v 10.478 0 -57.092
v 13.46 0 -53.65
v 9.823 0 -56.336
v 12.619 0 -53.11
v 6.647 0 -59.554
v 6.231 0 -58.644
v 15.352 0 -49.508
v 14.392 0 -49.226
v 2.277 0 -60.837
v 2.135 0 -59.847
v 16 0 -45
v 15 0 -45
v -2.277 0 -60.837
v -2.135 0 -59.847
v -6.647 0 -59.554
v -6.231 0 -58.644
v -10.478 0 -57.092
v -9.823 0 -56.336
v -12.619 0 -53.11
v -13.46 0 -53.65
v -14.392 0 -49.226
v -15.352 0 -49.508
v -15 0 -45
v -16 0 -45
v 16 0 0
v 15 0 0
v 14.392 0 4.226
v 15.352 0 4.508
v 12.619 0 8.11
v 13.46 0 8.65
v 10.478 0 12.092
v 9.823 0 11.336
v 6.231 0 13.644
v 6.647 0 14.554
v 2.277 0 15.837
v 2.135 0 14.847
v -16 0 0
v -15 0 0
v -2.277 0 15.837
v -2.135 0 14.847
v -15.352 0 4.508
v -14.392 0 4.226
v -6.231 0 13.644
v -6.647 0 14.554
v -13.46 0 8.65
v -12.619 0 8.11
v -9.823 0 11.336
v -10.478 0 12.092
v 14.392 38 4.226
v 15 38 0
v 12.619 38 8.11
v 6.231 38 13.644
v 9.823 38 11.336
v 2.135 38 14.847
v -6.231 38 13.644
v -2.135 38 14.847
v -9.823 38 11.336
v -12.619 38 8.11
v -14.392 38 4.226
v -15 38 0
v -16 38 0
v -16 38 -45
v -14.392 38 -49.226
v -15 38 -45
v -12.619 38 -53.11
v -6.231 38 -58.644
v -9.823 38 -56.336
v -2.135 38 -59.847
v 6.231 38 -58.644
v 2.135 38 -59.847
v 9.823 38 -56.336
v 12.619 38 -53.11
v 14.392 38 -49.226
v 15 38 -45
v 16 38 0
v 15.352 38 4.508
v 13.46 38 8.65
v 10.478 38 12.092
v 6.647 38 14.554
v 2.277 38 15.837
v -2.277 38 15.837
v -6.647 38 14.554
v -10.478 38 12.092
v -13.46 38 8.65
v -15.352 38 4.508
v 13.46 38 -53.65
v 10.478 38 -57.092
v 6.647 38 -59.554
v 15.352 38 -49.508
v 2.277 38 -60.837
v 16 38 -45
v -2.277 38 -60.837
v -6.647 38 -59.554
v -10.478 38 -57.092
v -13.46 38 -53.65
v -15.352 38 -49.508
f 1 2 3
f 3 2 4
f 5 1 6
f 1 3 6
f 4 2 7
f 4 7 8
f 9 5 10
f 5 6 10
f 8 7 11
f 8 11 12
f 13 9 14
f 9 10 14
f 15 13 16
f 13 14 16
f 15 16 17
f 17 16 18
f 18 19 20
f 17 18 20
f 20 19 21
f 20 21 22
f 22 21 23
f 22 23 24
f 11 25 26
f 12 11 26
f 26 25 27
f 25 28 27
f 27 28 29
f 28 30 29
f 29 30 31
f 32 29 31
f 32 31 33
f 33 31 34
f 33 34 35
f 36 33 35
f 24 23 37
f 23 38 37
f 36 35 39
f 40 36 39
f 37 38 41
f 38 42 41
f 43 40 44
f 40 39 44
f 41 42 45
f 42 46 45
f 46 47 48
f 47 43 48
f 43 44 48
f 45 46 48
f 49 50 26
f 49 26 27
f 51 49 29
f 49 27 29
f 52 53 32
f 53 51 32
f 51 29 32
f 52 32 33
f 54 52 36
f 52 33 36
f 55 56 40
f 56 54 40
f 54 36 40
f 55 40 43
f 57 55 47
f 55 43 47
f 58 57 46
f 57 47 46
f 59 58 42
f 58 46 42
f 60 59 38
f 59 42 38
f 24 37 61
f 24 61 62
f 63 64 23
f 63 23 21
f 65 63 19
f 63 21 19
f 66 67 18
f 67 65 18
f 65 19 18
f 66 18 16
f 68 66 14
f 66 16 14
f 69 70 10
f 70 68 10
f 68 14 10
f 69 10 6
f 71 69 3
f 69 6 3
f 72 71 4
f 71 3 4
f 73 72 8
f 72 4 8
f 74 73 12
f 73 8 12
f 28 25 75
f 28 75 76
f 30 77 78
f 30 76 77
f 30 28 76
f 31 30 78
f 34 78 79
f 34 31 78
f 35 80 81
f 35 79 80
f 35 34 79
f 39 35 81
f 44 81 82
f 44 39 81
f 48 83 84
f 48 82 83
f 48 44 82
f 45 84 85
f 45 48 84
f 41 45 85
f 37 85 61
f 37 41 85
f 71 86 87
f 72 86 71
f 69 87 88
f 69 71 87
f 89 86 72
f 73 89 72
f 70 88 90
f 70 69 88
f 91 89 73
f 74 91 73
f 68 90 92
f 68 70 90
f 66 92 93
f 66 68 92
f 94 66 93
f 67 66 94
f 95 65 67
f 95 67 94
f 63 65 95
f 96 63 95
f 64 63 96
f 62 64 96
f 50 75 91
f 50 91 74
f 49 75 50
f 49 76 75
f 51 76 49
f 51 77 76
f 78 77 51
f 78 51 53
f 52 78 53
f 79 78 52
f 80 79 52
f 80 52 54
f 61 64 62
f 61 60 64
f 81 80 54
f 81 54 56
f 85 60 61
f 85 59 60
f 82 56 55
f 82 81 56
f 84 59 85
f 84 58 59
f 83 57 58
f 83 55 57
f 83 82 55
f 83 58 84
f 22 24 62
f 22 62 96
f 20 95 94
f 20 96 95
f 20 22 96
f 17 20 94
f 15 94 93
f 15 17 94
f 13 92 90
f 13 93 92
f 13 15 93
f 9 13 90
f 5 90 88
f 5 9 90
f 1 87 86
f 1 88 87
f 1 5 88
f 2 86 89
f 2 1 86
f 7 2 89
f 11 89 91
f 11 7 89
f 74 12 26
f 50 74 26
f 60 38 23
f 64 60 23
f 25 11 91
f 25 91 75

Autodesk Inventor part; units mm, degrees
ref_plane "YZ Plane" through (0, 0, 0) normal (1, 0, 0) x (0, 1, 0)
ref_plane "XZ Plane" through (0, 0, 0) normal (0, 1, 0) x (-1, 0, 0)
ref_plane "XY Plane" through (0, 0, 0) normal (0, 0, 1) x (1, 0, 0)
sketch "Boceto1" plane through (0, 0, 0) normal (0, 1, 0) x (-1, 0, 0)
  arc A0 (16, 0) -> (-16, 0) centre (0, 0) ccw
  line L0 (0, 0) -> (45, 0) construction
  arc A1 (-16, -45) -> (16, -45) centre (0, -45) ccw
  line L1 (16, 0) -> (16, -45)
  line L2 (-16, -45) -> (-16, 0)
  arc A2 (15, 0) -> (-15, 0) centre (0, 0) ccw
  arc A3 (-15, -45) -> (15, -45) centre (0, -45) ccw
  line L3 (15, 0) -> (15, -45)
  line L4 (-15, -45) -> (-15, 0)
  dimension "d0" = 32
  dimension "d3" = 32
  dimension "d4" = 30
  dimension "d5" = 30
extrude "Extrusión1" add sketch "Boceto1" along normal blind 38
properties part number "Cinta"
